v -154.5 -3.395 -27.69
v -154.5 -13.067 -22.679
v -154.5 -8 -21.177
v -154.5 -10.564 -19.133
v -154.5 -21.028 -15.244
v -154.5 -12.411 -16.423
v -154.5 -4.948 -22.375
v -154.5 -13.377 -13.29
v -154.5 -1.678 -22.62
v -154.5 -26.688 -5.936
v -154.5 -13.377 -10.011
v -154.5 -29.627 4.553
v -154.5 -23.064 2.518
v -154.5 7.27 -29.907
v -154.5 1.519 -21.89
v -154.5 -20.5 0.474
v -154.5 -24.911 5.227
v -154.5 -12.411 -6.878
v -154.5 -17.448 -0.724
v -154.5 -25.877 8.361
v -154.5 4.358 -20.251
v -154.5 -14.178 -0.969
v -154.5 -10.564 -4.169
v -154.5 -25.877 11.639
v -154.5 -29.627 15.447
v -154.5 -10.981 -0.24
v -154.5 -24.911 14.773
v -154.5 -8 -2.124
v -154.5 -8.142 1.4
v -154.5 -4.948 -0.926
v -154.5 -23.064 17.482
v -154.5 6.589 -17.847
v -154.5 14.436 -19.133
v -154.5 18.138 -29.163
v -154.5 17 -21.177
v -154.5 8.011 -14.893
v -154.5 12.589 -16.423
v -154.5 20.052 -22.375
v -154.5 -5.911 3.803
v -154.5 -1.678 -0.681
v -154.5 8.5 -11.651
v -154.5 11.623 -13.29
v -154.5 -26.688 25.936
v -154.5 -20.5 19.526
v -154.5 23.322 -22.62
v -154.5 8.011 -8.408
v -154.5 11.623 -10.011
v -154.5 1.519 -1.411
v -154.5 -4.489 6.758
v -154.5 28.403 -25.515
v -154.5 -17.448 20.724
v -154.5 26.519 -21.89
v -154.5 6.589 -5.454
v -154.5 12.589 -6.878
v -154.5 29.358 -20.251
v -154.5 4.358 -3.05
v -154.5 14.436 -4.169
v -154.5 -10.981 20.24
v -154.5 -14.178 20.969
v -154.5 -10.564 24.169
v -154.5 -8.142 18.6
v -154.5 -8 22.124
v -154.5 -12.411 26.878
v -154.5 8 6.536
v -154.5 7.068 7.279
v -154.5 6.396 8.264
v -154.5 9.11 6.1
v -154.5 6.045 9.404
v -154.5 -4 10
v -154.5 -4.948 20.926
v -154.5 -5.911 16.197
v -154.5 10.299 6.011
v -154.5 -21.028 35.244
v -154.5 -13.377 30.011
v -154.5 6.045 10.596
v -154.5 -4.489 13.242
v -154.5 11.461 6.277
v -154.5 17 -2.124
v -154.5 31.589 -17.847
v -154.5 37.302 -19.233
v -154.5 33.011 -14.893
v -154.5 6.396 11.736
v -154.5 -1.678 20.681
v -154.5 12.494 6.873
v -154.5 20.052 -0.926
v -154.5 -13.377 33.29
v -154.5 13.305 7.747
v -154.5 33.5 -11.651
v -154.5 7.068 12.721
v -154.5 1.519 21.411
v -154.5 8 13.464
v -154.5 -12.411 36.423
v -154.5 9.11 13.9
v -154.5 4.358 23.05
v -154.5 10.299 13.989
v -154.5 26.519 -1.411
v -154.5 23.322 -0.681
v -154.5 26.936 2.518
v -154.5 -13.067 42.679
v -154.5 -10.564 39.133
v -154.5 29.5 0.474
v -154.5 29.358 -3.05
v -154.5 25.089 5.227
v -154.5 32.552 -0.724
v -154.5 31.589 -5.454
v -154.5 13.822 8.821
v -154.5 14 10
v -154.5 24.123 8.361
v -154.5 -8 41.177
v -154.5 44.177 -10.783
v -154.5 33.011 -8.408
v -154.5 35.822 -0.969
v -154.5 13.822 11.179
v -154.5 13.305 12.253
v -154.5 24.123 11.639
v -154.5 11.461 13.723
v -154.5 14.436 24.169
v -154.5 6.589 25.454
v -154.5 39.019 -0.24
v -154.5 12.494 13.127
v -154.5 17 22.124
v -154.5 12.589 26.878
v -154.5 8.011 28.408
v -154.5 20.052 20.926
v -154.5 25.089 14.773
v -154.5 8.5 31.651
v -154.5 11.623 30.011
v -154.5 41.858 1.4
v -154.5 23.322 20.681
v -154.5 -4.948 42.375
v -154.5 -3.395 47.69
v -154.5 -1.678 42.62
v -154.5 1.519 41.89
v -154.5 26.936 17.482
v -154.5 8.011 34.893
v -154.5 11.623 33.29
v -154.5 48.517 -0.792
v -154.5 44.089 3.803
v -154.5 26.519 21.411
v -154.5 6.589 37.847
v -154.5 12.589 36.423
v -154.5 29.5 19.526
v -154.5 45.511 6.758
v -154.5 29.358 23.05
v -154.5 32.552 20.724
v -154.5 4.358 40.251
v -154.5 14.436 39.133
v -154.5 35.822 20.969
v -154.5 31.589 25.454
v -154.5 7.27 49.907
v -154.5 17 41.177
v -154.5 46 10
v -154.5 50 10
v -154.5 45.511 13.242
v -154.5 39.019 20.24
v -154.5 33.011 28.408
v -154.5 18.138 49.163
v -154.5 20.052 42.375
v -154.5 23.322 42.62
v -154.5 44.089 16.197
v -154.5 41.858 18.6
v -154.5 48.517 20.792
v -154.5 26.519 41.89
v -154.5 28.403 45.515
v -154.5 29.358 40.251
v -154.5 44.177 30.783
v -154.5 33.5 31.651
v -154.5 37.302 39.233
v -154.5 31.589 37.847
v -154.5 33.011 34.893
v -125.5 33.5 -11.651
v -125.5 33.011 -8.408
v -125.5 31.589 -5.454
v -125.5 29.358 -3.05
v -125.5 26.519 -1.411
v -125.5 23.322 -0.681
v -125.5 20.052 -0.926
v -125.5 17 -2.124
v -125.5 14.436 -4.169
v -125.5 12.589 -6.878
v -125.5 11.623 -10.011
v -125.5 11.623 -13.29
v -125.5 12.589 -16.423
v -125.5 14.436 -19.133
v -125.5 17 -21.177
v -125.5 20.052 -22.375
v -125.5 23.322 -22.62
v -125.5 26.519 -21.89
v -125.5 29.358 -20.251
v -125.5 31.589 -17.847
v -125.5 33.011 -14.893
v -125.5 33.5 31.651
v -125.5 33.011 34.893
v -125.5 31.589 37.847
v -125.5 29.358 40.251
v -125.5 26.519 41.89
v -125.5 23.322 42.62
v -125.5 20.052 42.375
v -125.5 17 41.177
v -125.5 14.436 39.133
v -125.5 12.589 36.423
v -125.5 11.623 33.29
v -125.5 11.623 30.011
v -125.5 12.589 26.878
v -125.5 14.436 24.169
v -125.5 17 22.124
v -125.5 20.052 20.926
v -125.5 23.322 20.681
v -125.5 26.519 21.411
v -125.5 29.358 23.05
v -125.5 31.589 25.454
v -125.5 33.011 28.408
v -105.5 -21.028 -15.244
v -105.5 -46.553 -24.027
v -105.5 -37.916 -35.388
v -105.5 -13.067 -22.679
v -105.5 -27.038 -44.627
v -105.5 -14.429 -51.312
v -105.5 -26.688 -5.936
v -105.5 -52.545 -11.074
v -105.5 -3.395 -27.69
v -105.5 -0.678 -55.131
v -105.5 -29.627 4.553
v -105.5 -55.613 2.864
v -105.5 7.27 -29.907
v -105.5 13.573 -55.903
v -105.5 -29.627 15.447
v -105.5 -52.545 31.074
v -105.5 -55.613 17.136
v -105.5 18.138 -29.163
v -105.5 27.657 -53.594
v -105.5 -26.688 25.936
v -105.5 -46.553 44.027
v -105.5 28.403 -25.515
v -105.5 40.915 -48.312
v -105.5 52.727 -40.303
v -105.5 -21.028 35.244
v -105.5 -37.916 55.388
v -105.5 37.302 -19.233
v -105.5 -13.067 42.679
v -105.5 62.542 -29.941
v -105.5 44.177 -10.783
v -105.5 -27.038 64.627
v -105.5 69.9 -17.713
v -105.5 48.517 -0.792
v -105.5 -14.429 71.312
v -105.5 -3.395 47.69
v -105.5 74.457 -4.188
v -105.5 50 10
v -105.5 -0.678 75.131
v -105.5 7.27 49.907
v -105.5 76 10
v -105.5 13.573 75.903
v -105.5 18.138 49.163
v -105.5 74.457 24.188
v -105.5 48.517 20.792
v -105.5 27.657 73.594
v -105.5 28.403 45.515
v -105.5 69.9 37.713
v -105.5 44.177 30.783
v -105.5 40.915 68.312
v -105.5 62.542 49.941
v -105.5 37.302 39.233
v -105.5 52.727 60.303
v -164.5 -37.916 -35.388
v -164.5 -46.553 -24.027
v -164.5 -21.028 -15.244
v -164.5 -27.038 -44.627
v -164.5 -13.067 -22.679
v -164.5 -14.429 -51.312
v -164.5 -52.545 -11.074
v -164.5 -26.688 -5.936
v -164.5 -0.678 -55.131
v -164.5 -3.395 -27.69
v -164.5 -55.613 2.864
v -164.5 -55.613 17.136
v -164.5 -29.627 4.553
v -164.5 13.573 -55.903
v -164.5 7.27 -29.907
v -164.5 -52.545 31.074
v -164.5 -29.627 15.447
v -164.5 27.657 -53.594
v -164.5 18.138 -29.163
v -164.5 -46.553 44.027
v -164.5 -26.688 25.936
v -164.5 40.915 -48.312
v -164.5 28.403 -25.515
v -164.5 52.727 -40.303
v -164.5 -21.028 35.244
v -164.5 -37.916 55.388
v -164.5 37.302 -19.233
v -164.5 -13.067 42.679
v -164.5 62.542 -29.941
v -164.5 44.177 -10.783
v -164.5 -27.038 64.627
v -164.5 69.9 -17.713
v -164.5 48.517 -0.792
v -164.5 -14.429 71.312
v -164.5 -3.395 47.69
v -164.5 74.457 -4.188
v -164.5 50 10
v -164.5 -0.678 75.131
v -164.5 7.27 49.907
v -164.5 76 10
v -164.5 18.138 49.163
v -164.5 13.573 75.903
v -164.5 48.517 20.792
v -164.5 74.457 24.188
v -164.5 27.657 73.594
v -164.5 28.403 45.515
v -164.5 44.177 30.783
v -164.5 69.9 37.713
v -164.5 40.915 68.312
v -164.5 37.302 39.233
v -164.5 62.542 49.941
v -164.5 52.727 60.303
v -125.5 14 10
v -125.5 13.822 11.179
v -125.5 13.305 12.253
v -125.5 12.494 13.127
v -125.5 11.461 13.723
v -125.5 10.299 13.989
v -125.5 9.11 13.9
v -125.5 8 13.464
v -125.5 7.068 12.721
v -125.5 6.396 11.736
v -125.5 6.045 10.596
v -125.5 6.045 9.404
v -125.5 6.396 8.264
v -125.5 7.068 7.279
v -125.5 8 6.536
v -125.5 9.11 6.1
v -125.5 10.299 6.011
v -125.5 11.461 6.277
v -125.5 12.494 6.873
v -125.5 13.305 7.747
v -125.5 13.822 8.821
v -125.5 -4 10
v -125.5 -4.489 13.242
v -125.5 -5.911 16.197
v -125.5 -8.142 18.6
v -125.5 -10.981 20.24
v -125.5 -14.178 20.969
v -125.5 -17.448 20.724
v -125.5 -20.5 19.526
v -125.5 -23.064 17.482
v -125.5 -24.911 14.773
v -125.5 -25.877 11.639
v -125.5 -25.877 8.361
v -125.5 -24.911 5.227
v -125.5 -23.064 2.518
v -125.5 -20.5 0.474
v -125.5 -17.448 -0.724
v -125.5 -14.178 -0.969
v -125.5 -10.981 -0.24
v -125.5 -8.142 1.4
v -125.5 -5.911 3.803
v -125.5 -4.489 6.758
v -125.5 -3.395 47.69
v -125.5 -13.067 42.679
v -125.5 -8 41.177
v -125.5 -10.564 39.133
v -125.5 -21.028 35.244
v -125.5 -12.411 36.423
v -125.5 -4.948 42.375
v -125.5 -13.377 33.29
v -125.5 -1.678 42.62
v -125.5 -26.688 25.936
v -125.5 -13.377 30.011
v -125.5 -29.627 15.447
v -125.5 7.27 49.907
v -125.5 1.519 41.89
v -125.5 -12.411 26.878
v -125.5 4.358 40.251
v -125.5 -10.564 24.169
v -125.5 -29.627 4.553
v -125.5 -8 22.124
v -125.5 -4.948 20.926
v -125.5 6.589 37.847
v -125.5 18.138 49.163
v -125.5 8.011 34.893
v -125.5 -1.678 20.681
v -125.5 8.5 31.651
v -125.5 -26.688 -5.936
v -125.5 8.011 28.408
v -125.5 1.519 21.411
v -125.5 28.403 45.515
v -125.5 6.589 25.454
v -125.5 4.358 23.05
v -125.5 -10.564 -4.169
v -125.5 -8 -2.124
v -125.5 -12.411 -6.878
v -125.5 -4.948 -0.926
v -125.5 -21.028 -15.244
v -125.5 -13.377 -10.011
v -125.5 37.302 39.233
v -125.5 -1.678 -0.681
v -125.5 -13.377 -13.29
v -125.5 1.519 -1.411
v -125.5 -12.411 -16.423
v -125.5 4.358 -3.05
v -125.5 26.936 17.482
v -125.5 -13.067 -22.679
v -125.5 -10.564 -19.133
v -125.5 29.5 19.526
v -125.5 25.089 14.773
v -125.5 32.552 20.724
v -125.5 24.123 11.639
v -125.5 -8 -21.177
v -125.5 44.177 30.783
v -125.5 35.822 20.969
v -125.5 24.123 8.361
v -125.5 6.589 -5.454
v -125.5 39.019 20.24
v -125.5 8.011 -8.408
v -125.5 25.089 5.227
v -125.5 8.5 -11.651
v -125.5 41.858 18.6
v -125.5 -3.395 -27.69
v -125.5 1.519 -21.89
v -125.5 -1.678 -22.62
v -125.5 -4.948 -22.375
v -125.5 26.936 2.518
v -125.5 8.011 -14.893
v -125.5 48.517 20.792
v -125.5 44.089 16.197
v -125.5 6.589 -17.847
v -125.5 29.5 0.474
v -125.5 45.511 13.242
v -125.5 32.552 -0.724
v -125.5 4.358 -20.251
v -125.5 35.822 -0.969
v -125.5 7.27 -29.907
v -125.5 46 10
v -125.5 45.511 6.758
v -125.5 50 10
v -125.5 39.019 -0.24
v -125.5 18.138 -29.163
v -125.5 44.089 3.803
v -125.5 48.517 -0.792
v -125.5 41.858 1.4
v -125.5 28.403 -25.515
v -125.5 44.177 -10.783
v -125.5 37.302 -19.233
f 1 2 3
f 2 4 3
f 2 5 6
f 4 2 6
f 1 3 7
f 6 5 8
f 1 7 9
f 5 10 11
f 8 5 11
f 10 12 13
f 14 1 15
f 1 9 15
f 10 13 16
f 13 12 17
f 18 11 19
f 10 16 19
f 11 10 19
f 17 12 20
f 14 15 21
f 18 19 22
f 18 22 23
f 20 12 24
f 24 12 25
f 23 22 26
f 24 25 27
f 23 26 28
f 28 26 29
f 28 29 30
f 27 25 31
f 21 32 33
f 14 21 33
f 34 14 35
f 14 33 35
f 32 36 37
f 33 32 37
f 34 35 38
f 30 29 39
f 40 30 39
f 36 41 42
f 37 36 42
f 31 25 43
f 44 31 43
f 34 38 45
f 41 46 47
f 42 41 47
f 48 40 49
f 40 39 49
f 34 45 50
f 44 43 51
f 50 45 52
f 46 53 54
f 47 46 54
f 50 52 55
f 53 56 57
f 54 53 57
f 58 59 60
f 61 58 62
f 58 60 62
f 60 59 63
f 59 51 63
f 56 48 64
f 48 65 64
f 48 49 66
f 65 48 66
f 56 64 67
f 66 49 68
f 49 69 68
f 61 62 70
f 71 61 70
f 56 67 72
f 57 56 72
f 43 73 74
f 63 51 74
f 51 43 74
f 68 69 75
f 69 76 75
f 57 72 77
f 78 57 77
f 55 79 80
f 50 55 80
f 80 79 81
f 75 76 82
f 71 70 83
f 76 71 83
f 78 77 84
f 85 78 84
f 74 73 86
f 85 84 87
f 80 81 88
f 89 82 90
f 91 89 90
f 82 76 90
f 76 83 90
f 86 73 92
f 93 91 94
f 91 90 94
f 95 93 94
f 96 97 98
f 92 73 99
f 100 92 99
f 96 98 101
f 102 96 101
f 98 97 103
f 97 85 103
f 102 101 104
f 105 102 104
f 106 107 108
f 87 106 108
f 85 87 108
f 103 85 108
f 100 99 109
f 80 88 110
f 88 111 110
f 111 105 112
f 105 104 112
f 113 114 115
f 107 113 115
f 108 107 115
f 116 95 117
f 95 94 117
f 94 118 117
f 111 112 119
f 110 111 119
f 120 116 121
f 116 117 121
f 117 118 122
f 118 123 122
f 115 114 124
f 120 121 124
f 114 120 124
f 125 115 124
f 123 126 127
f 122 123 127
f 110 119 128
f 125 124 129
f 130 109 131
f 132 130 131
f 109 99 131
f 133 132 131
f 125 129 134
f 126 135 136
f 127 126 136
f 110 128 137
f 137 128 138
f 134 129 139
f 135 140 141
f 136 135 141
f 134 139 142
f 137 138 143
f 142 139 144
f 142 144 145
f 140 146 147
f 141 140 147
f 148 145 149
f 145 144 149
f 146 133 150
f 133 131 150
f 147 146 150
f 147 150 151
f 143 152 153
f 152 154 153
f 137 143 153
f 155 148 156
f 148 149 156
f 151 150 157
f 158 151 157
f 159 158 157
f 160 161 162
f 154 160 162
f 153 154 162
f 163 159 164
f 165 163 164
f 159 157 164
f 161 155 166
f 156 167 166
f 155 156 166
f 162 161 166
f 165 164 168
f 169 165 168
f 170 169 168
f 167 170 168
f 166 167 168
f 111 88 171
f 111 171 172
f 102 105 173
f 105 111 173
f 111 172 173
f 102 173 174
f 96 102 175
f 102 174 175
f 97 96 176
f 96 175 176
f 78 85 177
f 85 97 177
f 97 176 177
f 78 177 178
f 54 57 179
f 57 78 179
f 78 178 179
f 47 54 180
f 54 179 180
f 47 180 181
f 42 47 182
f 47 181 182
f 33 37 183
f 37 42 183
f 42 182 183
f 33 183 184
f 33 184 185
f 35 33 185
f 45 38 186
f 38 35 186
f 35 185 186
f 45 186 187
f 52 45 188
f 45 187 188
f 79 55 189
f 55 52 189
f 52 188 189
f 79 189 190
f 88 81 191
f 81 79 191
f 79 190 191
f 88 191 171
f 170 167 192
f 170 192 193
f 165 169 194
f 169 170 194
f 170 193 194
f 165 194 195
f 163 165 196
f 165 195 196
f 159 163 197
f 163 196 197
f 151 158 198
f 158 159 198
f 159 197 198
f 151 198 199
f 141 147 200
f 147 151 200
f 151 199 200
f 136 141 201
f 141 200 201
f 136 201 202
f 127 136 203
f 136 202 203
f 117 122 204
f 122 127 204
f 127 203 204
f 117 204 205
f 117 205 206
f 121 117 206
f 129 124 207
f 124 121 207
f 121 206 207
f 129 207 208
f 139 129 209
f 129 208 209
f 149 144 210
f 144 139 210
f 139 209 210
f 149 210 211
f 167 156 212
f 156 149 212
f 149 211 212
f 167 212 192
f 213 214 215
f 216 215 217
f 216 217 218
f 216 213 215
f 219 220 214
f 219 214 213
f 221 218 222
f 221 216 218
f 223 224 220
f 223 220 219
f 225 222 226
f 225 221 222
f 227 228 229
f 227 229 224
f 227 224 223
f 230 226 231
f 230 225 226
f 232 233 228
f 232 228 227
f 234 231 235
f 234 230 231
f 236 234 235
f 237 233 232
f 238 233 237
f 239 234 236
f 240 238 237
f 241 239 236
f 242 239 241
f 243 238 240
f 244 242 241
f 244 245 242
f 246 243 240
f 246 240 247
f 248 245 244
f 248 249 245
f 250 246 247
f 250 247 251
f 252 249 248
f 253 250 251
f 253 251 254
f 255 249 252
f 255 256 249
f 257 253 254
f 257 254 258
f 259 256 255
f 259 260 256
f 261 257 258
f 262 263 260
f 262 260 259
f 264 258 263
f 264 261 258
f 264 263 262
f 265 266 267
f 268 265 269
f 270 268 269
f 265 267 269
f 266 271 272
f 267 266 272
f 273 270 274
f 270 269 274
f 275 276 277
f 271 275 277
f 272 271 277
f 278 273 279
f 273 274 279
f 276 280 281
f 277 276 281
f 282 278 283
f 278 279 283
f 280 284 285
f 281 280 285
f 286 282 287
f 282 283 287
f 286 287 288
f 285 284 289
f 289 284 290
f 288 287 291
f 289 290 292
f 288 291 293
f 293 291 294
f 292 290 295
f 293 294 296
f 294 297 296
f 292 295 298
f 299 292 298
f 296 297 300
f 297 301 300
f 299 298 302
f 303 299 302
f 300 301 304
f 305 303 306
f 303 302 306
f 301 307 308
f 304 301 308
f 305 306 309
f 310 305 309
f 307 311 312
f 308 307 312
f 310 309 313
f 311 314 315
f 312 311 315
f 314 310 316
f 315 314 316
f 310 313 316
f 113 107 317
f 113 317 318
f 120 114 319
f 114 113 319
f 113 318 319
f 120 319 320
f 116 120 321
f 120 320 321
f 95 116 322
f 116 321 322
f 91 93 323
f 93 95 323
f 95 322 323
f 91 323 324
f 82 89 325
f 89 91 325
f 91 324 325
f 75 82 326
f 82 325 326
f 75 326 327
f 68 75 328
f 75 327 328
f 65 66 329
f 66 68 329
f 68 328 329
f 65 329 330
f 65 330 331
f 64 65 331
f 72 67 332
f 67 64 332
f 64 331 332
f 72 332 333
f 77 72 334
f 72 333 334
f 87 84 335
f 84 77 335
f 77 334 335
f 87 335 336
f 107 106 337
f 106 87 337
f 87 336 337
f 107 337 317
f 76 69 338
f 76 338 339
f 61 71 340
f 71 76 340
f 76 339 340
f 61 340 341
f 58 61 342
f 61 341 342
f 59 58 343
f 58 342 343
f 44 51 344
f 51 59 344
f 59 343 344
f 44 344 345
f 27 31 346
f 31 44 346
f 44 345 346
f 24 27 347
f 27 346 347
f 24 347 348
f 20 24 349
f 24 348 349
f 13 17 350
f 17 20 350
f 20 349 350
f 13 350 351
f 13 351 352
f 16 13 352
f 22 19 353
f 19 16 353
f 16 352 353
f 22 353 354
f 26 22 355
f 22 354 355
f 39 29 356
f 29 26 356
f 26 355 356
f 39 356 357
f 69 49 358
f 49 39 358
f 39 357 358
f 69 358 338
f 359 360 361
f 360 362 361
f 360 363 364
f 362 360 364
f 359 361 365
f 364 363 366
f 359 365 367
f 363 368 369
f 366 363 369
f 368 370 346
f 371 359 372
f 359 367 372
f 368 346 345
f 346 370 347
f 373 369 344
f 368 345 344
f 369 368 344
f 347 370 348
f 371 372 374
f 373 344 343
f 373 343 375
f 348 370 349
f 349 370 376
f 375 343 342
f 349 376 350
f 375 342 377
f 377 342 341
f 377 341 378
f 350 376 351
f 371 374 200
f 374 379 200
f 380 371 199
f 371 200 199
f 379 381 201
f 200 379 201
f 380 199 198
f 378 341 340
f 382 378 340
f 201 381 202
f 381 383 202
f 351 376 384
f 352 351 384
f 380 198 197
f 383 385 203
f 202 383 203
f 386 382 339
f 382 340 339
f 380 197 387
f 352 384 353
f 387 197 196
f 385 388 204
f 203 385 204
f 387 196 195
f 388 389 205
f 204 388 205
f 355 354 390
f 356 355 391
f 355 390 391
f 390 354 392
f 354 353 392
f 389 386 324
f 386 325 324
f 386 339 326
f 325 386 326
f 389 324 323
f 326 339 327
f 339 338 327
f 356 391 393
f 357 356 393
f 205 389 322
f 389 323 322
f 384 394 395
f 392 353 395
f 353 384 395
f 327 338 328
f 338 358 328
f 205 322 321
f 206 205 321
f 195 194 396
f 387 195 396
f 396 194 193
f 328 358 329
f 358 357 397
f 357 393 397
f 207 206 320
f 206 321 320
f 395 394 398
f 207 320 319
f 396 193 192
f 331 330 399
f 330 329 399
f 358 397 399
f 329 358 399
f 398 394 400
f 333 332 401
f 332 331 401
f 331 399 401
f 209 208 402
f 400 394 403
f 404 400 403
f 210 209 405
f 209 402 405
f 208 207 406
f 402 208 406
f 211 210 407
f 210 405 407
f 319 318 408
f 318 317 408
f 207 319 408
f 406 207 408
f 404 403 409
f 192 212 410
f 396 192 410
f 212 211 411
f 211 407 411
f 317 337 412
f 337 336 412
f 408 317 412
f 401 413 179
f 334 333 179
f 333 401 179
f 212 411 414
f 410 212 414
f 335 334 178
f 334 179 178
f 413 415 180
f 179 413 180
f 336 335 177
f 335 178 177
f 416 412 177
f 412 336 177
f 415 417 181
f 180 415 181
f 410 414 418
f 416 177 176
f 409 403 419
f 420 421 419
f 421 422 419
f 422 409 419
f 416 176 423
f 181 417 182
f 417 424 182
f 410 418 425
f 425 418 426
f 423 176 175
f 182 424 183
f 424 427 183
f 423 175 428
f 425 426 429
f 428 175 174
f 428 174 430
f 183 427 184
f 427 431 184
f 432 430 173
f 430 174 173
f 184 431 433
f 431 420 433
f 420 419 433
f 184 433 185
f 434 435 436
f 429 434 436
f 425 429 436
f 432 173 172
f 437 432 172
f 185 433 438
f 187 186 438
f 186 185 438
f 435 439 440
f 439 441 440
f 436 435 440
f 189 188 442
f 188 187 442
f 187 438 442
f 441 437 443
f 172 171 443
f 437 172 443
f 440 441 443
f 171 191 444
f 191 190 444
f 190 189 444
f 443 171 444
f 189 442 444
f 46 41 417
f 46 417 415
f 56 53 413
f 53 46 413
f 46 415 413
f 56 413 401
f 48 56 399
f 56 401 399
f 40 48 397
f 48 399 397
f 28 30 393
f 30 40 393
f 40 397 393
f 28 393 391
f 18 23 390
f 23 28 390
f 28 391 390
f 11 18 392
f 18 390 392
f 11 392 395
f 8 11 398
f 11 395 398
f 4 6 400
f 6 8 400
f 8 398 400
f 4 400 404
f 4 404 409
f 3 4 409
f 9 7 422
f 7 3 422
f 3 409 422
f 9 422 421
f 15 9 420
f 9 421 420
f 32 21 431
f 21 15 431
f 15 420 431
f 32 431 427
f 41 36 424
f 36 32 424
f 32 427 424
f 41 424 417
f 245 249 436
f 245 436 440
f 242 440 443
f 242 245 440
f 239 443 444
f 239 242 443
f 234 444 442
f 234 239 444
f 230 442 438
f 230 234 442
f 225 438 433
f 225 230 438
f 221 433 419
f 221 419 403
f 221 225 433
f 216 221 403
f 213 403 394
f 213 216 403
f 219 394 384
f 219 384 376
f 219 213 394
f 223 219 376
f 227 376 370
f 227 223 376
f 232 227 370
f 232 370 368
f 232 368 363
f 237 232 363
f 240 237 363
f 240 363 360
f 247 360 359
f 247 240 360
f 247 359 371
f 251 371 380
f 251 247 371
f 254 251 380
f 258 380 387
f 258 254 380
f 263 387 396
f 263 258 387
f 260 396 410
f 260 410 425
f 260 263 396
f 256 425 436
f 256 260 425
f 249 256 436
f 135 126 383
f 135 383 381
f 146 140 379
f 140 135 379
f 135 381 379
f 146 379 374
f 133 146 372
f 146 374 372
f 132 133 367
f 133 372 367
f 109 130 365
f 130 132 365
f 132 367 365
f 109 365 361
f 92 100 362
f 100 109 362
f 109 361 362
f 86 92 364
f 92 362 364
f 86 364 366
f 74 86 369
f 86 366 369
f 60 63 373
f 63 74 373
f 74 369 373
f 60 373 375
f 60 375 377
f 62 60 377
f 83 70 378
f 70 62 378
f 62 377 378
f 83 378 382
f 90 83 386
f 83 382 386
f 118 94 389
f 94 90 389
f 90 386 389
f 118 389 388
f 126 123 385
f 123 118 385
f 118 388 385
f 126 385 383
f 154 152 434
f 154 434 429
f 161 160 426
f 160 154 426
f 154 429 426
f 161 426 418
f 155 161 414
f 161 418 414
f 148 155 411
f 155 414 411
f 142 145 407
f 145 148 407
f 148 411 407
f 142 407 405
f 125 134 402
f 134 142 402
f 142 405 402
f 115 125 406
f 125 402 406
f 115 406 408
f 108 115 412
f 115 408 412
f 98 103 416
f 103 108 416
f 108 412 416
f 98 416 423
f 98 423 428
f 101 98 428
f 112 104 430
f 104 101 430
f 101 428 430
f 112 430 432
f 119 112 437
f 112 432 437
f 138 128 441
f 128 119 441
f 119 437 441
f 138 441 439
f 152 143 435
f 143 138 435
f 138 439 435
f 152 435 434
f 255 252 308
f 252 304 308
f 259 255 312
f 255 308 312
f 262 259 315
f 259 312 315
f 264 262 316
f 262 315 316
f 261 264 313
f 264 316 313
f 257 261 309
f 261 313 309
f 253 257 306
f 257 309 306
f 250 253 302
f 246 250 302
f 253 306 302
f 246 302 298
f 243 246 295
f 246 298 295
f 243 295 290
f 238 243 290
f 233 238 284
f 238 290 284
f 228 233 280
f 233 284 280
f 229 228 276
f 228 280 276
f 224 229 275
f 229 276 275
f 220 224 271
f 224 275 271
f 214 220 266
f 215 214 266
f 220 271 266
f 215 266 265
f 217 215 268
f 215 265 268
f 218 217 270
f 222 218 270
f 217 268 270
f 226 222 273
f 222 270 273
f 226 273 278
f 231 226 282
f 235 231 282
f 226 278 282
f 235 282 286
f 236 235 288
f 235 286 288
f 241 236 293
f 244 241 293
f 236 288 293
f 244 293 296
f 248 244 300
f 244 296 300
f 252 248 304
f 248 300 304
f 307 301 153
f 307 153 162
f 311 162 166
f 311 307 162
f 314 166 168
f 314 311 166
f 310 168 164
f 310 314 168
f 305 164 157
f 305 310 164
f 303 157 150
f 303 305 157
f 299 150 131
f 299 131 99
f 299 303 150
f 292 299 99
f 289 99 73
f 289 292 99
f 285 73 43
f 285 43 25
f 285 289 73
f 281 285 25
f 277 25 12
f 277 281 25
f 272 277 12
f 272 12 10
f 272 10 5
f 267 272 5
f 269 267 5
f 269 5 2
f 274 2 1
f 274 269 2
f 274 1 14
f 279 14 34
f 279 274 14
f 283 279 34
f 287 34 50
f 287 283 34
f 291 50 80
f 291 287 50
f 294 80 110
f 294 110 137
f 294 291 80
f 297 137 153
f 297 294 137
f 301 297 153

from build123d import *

# Parameters (mm, degrees)
SKETCH004_R     = 66
SKETCH004_R_2   = 4
SKETCH004_R_3   = 11
PAD003_DEPTH    = 29.5
SKETCH005_R     = 40
POCKET001_DEPTH = 20
SKETCH006_R     = 40
POCKET002_DEPTH = 10


with BuildPart() as wheel_right:
    # Sketch004 → Pad003 (new body, symmetric)
    with BuildSketch(Plane.YZ):
        Circle(SKETCH004_R)
        Circle(SKETCH004_R_2, mode=Mode.SUBTRACT)
        with Locations((12.5, -21.650635)):
            Circle(SKETCH004_R_3, mode=Mode.SUBTRACT)
        with Locations((25, 0)):
            Circle(SKETCH004_R_3, mode=Mode.SUBTRACT)
        with Locations((12.5, 21.650635)):
            Circle(SKETCH004_R_3, mode=Mode.SUBTRACT)
        with Locations((-12.5, 21.650635)):
            Circle(SKETCH004_R_3, mode=Mode.SUBTRACT)
        with Locations((-25, 0)):
            Circle(SKETCH004_R_3, mode=Mode.SUBTRACT)
        with Locations((-12.5, -21.650635)):
            Circle(SKETCH004_R_3, mode=Mode.SUBTRACT)
    extrude(amount=PAD003_DEPTH, both=True)

    # Sketch005 (on Face3 of Pad003) → Pocket001 (cut)
    with BuildSketch(Plane(origin=(-29.5, 0, 0), x_dir=(0, 1, 0), z_dir=(-1, 0, 0))):
        Circle(SKETCH005_R)
    extrude(amount=-POCKET001_DEPTH, mode=Mode.SUBTRACT)

    # Sketch006 (on Face3 of Pocket001) → Pocket002 (cut)
    with BuildSketch(Plane.YZ.offset(29.5)):
        Circle(SKETCH006_R)
    extrude(amount=-POCKET002_DEPTH, mode=Mode.SUBTRACT)


with BuildPart() as wheel_right_1:
    # Body003 placement: moved
    add(wheel_right.part.moved(Location((135, 10, 10))))


with BuildPart() as part_mirroring001:
    # Part__Mirroring001: instance of wheel right
    add(wheel_right_1.part.mirror(Plane(origin=(0, 0, 0), x_dir=(0, -1, 0), z_dir=(1, 0, 0))))


solid = part_mirroring001.part
